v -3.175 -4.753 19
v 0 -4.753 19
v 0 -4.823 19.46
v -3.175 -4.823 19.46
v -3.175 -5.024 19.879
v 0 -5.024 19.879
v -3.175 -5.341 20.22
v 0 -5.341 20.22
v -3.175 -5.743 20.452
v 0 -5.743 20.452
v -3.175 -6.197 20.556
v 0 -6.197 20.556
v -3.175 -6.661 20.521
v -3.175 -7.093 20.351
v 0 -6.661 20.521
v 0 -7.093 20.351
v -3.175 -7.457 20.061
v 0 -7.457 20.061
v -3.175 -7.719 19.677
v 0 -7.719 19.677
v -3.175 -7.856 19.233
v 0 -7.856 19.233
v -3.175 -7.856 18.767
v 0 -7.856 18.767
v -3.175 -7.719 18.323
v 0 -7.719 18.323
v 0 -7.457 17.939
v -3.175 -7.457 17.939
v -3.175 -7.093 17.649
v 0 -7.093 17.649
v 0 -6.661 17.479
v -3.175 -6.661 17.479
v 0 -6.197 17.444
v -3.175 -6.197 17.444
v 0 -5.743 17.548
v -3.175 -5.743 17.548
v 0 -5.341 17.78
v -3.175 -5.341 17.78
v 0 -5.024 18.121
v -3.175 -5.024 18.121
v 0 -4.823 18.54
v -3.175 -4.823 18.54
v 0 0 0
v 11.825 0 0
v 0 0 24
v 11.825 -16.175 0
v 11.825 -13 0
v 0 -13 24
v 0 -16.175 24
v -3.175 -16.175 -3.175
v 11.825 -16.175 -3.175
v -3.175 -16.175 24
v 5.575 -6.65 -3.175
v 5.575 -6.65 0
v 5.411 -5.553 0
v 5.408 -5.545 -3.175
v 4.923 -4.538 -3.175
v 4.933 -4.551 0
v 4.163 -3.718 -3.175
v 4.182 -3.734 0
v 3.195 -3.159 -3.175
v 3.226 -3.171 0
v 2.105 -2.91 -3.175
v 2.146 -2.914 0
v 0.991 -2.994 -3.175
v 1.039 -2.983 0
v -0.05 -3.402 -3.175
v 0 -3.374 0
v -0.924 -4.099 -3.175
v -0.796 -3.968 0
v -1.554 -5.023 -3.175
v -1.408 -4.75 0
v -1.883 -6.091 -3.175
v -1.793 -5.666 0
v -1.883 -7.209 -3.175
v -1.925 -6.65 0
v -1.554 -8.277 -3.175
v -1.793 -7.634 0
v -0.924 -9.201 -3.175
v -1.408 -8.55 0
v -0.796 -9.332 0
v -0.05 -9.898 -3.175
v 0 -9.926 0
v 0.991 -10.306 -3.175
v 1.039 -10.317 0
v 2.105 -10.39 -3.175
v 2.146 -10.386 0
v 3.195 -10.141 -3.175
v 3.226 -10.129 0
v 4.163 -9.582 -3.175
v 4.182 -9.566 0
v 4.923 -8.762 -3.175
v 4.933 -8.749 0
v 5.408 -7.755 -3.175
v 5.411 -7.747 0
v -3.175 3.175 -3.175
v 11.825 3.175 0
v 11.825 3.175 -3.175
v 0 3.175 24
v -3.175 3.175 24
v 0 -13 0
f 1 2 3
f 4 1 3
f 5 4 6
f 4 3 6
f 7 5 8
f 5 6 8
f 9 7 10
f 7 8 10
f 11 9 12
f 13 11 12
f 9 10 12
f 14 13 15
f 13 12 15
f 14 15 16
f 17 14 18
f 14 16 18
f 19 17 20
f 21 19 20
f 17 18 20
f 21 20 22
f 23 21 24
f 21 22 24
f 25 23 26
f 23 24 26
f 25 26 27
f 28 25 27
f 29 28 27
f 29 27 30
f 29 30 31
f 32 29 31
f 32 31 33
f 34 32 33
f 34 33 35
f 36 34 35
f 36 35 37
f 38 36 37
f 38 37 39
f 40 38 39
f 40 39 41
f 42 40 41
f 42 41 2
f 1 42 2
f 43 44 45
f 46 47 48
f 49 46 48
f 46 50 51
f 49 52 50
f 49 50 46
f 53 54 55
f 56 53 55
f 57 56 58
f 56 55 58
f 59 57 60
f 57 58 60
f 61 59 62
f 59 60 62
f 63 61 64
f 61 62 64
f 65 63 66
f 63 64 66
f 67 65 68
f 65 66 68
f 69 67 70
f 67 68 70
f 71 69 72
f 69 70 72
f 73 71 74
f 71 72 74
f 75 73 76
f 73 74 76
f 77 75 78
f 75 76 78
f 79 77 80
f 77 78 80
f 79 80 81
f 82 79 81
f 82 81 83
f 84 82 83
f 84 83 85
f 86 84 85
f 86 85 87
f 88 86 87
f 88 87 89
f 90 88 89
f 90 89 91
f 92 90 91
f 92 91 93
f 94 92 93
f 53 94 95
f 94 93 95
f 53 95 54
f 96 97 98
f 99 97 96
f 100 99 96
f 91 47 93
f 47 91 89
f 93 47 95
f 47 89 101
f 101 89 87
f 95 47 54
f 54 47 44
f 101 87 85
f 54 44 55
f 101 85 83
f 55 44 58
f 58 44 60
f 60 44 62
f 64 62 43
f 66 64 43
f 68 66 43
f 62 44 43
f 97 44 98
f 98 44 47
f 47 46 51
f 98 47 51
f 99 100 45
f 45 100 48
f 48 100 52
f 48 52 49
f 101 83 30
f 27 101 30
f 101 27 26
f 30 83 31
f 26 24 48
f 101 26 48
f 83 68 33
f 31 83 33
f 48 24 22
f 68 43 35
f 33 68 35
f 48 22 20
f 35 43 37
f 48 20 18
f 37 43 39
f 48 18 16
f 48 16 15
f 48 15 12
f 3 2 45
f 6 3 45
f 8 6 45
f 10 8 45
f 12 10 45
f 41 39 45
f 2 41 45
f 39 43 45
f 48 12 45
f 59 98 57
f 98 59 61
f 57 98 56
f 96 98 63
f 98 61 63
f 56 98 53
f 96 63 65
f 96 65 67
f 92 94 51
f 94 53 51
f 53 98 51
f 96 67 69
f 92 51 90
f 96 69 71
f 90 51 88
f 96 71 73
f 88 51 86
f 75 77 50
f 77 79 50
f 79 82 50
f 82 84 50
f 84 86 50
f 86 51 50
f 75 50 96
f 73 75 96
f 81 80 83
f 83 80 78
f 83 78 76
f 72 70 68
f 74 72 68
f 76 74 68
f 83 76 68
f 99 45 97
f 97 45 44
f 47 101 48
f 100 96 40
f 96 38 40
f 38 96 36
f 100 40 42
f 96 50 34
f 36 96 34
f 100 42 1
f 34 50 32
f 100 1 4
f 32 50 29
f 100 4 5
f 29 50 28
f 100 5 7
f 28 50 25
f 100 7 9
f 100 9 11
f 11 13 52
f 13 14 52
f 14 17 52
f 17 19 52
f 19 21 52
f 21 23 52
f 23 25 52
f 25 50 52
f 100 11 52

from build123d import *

# Parameters (mm, degrees)
F1_DEPTH = 13
F3_DEPTH = 3.175
F5_DEPTH = 3.175
F6_R     = 3.75
F7_DEPTH = 3.176
F8_R     = 1.56
F9_DEPTH = 3.176


with BuildPart() as f1:
    # F0 (on Front) → F1 (new body)
    with BuildSketch(Plane.XZ):
        Polygon((0, 24), (-3.175, 24), (-3.175, -3.175), (11.825, -3.175), (11.825, 0), (0, 0), align=None)
    extrude(amount=F1_DEPTH)

    # F2 (on face) → F3 (join)
    with BuildSketch(Plane.XZ.offset(13)):
        Polygon((0, 24), (-3.175, 24), (-3.175, -3.175), (11.825, -3.175), (11.825, 0), align=None)
    extrude(amount=F3_DEPTH)

    # F4 (on face) → F5 (join)
    with BuildSketch(Plane(origin=(0, 0, 0), x_dir=(-1, 0, 0), z_dir=(0, 1, 0))):
        Polygon((3.175, -3.175), (3.175, 24), (0, 24), (-11.825, 0), (-11.825, -3.175), align=None)
    extrude(amount=F5_DEPTH)

    # F6 (on face) → F7 (cut, through all)
    with BuildSketch(Plane.XY):
        with Locations((1.825, -6.65)):
            Circle(F6_R)
    extrude(amount=-F7_DEPTH, mode=Mode.SUBTRACT)

    # F8 (on face) → F9 (cut, through all)
    with BuildSketch(Plane.YZ):
        with Locations((-6.313409, 19)):
            Circle(F8_R)
    extrude(amount=-F9_DEPTH, mode=Mode.SUBTRACT)


solid = f1.part
